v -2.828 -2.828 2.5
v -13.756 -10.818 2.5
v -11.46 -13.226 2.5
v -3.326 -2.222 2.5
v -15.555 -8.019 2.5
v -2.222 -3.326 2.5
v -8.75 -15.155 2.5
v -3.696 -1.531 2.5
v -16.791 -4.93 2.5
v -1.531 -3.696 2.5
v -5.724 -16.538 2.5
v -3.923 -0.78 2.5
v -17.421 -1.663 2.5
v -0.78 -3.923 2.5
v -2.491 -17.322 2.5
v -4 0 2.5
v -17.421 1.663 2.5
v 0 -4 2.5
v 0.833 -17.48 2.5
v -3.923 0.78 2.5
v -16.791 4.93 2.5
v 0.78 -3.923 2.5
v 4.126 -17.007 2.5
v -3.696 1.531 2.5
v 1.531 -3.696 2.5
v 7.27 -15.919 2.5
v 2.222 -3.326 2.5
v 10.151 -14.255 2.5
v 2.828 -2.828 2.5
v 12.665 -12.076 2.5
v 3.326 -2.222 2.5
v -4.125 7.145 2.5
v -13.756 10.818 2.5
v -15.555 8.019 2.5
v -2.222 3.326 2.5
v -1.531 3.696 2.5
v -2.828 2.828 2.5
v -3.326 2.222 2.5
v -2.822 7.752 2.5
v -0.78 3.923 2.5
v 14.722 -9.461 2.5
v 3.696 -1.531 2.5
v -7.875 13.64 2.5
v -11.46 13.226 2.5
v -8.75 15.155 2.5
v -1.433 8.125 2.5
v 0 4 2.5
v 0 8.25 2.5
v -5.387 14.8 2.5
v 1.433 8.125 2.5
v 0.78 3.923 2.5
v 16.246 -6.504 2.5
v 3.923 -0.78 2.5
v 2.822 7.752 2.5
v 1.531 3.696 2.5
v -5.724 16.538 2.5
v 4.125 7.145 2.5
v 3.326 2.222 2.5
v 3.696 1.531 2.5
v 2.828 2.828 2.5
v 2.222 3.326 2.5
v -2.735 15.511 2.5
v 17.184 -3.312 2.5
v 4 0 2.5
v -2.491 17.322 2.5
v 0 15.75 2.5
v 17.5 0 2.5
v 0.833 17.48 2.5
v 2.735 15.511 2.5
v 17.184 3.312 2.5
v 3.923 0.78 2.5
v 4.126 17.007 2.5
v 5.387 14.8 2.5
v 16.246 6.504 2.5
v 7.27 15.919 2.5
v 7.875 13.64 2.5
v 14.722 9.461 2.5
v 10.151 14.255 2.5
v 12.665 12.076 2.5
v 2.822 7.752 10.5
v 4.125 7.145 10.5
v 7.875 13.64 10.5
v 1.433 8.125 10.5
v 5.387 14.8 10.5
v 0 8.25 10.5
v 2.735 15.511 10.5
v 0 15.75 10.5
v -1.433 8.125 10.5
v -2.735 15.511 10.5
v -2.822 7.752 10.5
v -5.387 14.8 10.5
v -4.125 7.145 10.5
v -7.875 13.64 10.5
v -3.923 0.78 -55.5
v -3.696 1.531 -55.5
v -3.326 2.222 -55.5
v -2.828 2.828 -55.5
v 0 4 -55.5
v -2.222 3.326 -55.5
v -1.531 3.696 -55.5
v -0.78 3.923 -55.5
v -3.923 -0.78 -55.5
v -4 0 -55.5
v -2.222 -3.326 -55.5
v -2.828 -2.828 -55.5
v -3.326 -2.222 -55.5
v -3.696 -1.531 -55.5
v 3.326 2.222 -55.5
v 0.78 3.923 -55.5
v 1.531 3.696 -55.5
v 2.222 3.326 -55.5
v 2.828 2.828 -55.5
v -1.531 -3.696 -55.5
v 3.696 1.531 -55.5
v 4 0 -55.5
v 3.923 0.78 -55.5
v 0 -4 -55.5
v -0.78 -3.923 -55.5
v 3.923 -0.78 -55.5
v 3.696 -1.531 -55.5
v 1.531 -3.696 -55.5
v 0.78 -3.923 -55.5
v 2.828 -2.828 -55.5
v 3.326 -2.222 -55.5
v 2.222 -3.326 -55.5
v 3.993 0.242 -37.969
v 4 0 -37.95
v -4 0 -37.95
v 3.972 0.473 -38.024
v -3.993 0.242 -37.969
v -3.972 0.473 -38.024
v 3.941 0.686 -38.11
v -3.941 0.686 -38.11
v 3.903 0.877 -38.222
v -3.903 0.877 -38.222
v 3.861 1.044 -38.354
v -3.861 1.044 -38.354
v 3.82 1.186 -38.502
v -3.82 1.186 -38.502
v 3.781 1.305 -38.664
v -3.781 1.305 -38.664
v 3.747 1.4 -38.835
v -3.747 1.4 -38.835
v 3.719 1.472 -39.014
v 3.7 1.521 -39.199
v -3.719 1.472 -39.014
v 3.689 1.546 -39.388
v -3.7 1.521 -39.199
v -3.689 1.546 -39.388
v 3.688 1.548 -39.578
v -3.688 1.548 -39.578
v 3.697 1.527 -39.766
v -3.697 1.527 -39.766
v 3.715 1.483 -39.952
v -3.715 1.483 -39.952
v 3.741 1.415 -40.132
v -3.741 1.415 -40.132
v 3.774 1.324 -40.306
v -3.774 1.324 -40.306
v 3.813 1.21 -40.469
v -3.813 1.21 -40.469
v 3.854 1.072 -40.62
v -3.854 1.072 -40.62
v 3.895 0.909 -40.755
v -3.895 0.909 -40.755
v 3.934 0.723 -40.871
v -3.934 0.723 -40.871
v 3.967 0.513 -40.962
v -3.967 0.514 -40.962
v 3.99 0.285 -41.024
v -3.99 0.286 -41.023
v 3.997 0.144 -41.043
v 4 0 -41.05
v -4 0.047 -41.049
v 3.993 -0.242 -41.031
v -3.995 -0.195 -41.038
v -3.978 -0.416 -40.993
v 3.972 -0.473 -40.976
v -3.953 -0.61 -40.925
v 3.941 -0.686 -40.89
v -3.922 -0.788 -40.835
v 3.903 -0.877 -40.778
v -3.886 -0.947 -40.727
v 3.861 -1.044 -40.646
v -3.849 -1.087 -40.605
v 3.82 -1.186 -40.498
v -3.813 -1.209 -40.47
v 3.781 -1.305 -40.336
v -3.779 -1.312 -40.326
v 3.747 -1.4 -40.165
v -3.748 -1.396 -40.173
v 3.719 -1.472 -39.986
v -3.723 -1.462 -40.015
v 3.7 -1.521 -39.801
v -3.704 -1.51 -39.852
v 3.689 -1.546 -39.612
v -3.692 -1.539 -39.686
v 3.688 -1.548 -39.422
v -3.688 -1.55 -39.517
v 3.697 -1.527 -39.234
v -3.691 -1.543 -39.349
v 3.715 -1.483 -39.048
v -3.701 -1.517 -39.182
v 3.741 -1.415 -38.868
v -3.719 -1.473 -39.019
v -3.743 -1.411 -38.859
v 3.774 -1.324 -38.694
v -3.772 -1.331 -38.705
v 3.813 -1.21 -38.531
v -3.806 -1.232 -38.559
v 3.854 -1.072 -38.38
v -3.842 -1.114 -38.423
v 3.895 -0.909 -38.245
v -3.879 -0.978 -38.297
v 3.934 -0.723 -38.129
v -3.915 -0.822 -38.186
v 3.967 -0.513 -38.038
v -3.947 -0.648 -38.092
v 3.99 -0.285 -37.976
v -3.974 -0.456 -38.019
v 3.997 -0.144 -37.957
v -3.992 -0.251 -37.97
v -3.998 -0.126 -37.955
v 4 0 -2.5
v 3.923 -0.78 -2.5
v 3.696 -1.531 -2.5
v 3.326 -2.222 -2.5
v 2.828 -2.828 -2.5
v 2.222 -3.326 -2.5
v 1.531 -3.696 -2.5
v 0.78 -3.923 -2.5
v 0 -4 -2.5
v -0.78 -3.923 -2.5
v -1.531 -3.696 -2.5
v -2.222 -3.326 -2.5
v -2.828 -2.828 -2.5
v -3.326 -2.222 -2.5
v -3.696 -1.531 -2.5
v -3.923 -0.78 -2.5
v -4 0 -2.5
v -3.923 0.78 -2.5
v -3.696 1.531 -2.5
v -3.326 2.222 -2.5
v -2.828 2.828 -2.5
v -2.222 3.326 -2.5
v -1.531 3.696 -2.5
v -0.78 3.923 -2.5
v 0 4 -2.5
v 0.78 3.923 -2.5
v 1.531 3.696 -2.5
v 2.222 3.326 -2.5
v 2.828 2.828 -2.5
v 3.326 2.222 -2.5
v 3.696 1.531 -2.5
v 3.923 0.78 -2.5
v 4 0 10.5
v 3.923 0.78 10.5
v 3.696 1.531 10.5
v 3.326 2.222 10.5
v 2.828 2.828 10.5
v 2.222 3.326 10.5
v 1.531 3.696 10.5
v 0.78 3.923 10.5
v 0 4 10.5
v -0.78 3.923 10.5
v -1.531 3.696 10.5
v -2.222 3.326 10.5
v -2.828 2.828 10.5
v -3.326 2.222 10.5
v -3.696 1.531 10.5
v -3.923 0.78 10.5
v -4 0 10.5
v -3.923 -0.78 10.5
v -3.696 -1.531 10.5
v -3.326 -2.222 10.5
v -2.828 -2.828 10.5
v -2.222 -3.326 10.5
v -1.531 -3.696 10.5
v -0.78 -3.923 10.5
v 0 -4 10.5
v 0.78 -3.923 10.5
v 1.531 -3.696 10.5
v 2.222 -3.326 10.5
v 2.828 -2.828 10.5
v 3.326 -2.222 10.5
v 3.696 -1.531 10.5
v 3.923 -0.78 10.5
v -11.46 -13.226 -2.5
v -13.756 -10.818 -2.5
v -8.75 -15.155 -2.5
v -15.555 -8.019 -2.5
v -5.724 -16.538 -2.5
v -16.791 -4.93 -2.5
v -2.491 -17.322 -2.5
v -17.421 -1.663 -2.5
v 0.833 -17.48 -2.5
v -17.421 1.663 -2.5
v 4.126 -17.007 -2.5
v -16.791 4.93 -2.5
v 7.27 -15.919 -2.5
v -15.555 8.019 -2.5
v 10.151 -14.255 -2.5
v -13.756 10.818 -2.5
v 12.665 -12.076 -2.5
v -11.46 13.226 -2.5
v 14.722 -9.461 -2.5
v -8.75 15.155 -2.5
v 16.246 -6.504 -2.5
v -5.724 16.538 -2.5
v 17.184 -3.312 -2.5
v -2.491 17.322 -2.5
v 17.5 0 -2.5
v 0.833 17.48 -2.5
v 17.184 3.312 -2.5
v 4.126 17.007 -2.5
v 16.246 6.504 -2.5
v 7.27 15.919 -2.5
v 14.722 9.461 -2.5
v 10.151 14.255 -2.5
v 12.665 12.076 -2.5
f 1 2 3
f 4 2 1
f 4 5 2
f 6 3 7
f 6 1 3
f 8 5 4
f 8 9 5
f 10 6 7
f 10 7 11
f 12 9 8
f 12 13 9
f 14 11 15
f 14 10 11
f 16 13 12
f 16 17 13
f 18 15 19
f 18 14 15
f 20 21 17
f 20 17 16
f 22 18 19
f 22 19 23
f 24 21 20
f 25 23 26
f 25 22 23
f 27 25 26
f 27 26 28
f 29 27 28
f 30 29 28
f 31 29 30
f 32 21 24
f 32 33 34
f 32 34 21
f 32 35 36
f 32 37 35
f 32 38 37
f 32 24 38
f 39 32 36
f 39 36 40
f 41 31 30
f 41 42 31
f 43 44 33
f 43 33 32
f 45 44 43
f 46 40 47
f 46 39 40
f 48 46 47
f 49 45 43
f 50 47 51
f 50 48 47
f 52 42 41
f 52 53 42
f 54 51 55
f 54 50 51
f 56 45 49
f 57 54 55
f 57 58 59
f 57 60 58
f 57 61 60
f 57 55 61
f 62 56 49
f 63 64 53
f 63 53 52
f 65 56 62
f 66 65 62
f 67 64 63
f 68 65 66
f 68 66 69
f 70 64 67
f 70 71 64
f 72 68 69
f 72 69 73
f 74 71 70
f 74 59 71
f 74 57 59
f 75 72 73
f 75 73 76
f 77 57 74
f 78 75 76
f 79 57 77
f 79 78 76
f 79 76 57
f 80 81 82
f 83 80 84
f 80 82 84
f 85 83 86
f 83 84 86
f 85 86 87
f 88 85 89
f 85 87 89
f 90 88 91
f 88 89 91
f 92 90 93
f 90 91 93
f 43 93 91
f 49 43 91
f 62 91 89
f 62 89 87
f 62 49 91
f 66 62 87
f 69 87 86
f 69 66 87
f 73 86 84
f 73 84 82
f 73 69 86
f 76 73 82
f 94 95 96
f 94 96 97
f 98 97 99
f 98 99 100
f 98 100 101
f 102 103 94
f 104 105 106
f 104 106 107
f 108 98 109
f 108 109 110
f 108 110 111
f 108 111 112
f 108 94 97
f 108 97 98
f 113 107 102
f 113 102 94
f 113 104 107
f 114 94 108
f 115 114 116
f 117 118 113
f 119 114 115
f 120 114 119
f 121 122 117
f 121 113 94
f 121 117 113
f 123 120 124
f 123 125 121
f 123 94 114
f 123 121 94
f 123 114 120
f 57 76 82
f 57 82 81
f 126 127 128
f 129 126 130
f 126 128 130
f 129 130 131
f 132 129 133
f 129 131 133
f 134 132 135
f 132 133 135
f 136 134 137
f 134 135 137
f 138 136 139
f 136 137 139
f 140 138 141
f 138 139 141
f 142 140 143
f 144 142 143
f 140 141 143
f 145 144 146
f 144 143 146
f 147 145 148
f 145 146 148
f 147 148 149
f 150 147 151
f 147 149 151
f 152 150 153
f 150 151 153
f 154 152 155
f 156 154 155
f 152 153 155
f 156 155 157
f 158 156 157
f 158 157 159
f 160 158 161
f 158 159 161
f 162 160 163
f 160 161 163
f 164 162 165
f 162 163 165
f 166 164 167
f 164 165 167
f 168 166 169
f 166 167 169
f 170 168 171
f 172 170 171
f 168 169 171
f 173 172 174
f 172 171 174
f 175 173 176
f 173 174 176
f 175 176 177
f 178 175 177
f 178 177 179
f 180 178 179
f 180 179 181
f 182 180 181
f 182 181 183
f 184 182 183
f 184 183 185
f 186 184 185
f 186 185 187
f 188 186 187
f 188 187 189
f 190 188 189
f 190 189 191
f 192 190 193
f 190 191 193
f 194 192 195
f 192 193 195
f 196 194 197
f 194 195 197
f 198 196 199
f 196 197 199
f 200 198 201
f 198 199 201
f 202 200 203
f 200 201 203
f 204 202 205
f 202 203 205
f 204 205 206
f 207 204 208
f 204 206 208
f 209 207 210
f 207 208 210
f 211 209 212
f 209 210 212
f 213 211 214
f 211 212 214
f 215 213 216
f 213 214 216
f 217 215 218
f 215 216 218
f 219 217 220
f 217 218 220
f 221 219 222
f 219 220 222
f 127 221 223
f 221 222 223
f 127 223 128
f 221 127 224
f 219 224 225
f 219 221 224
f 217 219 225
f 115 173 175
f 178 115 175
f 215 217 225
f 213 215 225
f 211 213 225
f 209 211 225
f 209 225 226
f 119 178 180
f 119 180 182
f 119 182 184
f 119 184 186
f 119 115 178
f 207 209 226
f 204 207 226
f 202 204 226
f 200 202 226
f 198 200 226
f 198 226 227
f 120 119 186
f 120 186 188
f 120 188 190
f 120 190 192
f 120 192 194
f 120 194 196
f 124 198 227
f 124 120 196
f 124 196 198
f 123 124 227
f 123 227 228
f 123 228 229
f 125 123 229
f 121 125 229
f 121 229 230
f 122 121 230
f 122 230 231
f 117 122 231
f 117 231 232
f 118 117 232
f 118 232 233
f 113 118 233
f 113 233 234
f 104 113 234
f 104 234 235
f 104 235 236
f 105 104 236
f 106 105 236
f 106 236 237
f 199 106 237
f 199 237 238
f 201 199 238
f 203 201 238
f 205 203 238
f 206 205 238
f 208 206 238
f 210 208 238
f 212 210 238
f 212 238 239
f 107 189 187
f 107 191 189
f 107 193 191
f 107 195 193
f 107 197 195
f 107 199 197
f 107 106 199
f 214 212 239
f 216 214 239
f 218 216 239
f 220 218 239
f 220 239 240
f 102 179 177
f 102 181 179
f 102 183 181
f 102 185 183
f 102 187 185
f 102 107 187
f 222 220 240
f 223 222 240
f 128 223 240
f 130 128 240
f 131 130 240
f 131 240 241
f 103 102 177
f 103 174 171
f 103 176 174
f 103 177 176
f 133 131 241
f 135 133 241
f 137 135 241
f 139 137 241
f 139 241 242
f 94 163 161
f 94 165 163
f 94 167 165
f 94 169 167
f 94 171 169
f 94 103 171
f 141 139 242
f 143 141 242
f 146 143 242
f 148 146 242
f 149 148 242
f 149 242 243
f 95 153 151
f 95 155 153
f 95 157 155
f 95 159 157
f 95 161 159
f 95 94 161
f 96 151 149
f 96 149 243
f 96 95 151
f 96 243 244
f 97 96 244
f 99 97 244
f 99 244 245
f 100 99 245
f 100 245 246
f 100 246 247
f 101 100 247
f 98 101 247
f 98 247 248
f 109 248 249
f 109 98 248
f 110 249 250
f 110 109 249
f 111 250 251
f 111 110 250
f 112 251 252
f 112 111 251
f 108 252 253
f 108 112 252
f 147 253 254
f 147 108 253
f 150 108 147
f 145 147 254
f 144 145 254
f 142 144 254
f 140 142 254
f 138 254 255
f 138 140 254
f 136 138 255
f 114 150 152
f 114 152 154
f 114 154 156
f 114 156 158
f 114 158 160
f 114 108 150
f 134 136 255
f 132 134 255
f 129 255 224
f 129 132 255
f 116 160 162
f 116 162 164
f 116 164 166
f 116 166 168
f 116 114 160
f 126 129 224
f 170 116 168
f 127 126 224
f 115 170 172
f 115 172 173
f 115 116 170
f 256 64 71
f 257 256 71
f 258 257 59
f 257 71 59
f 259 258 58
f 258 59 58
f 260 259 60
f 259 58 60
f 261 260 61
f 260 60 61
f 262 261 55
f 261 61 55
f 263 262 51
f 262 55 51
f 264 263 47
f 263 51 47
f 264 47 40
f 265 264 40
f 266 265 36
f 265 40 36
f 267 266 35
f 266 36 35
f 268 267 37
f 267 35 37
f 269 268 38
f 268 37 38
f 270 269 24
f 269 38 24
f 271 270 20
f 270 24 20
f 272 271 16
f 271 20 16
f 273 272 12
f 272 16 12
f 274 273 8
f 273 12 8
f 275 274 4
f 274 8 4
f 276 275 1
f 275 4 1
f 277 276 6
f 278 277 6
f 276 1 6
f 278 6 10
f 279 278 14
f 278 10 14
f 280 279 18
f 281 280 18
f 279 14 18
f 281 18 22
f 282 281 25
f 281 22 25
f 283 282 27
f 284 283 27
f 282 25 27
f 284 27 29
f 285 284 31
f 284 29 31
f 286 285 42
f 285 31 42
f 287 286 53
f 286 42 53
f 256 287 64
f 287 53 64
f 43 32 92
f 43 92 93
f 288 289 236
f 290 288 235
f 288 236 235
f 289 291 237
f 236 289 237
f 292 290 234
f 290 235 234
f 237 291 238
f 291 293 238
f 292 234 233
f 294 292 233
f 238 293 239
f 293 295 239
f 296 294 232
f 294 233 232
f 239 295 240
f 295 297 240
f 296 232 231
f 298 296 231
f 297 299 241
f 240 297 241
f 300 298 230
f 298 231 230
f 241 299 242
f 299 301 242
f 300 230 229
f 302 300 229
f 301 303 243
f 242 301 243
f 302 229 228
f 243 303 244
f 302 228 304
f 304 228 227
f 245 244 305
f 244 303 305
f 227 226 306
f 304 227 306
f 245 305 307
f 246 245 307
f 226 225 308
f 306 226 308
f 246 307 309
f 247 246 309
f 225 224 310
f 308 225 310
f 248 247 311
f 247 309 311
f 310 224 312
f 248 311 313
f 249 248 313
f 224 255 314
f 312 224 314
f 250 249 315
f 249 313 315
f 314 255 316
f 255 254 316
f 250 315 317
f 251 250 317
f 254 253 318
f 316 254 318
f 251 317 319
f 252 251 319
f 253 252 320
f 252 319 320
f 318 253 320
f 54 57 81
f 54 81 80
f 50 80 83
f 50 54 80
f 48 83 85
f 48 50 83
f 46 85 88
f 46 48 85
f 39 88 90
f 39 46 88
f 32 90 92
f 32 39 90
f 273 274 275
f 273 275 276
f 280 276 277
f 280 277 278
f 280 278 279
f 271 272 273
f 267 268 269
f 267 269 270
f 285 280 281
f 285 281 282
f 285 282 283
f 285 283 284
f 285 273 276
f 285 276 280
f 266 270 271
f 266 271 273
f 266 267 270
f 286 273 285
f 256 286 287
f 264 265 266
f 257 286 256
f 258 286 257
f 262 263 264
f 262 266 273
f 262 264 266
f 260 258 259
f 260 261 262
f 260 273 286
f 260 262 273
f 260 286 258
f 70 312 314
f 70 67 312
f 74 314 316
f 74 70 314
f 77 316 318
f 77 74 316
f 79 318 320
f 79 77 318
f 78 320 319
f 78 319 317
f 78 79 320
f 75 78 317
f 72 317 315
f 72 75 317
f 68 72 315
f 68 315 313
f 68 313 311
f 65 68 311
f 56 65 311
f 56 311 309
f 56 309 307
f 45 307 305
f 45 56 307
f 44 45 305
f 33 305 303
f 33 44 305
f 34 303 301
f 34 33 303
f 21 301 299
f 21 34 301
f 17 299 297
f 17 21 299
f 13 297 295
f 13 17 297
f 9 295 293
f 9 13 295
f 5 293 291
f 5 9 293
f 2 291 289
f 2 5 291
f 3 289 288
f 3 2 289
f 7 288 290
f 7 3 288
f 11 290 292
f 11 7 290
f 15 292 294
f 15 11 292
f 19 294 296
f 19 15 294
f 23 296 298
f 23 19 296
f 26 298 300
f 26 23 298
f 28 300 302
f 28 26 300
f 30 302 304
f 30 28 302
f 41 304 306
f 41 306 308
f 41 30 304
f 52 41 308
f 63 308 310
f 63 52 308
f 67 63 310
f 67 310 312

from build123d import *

# Parameters (mm, degrees)
SKETCH1_R                           = 17.5
BOSS_EXTRUDE1_DEPTH                 = 2.5
BOSS_EXTRUDE2_DEPTH                 = 8
SKETCH3_R                           = 4
BOSS_EXTRUDE3_DEPTH                 = 8
BOSS_EXTRUDE4_START                 = 53
SKETCH7_R                           = 4
BOSS_EXTRUDE4_DEPTH                 = 53
CUT_EXTRUDE1_REACH                  = 62.768
CUT_EXTRUDE1_END_RADIUS             = 4
SKETCH8_R                           = 1.55
CUT_EXTRUDE1_DIRECTION_2_REACH      = 62.768
CUT_EXTRUDE1_DIRECTION_2_END_RADIUS = 4


with BuildPart() as part:
    # Sketch1 → Boss-Extrude1 (new, symmetric)
    with BuildSketch(Plane.XY):
        Circle(SKETCH1_R)
    extrude(amount=BOSS_EXTRUDE1_DEPTH, both=True)

    # Sketch2 → Boss-Extrude2 (add)
    with BuildSketch(Plane.XY.offset(2.5)):
        with BuildLine():
            Line((7.875, 13.63990011), (4.125, 7.144709581))
            ThreePointArc((4.125, 7.144709581), (0, 8.25), (-4.125, 7.144709581))
            Line((-4.125, 7.144709581), (-7.875, 13.63990011))
            ThreePointArc((-7.875, 13.63990011), (0, 15.75), (7.875, 13.63990011))
        make_face()
    extrude(amount=BOSS_EXTRUDE2_DEPTH)

    # Sketch3 → Boss-Extrude3 (add)
    with BuildSketch(Plane.XY.offset(2.5)):
        Circle(SKETCH3_R)
    extrude(amount=BOSS_EXTRUDE3_DEPTH)

    # Sketch7 → Boss-Extrude4 (add)
    with BuildSketch(Plane(origin=(0, 0, -2.5), x_dir=(-1, 0, 0), z_dir=(0, 0, -1)).offset(BOSS_EXTRUDE4_START)):
        Circle(SKETCH7_R)
    extrude(amount=-BOSS_EXTRUDE4_DEPTH)

    # Cut-Extrude1: up to this cylinder (the profile starts inside it)
    cut_extrude1_end = Plane(origin=(0, 0, -39.5), z_dir=(0, 0, 1)) * Cylinder(CUT_EXTRUDE1_END_RADIUS, 134.536, mode=Mode.PRIVATE)
    # Sketch8 → Cut-Extrude1 (cut, up to the surface)
    with BuildSketch(Plane.ZY, mode=Mode.PRIVATE) as cut_extrude1_sk1:
        with Locations((-39.5, 0)):
            Circle(SKETCH8_R)
    cut_extrude1_tool1 = extrude(cut_extrude1_sk1.sketch, amount=-CUT_EXTRUDE1_REACH, mode=Mode.PRIVATE) & cut_extrude1_end
    add(cut_extrude1_tool1.solids().sort_by_distance((0, 0, -39.5))[0], mode=Mode.SUBTRACT)

    # Cut-Extrude1 direction 2: up to this cylinder (the profile starts inside it)
    cut_extrude1_direction_2_end = Plane(origin=(0, 0, -39.5), z_dir=(0, 0, 1)) * Cylinder(CUT_EXTRUDE1_DIRECTION_2_END_RADIUS, 134.536, mode=Mode.PRIVATE)
    # Sketch8 → Cut-Extrude1 direction 2 (cut, up to the surface)
    with BuildSketch(Plane.ZY, mode=Mode.PRIVATE) as cut_extrude1_direction_2_sk1:
        with Locations((-39.5, 0)):
            Circle(SKETCH8_R)
    cut_extrude1_direction_2_tool1 = extrude(cut_extrude1_direction_2_sk1.sketch, amount=CUT_EXTRUDE1_DIRECTION_2_REACH, mode=Mode.PRIVATE) & cut_extrude1_direction_2_end
    add(cut_extrude1_direction_2_tool1.solids().sort_by_distance((0, 0, -39.5))[0], mode=Mode.SUBTRACT)


solid = part.part
